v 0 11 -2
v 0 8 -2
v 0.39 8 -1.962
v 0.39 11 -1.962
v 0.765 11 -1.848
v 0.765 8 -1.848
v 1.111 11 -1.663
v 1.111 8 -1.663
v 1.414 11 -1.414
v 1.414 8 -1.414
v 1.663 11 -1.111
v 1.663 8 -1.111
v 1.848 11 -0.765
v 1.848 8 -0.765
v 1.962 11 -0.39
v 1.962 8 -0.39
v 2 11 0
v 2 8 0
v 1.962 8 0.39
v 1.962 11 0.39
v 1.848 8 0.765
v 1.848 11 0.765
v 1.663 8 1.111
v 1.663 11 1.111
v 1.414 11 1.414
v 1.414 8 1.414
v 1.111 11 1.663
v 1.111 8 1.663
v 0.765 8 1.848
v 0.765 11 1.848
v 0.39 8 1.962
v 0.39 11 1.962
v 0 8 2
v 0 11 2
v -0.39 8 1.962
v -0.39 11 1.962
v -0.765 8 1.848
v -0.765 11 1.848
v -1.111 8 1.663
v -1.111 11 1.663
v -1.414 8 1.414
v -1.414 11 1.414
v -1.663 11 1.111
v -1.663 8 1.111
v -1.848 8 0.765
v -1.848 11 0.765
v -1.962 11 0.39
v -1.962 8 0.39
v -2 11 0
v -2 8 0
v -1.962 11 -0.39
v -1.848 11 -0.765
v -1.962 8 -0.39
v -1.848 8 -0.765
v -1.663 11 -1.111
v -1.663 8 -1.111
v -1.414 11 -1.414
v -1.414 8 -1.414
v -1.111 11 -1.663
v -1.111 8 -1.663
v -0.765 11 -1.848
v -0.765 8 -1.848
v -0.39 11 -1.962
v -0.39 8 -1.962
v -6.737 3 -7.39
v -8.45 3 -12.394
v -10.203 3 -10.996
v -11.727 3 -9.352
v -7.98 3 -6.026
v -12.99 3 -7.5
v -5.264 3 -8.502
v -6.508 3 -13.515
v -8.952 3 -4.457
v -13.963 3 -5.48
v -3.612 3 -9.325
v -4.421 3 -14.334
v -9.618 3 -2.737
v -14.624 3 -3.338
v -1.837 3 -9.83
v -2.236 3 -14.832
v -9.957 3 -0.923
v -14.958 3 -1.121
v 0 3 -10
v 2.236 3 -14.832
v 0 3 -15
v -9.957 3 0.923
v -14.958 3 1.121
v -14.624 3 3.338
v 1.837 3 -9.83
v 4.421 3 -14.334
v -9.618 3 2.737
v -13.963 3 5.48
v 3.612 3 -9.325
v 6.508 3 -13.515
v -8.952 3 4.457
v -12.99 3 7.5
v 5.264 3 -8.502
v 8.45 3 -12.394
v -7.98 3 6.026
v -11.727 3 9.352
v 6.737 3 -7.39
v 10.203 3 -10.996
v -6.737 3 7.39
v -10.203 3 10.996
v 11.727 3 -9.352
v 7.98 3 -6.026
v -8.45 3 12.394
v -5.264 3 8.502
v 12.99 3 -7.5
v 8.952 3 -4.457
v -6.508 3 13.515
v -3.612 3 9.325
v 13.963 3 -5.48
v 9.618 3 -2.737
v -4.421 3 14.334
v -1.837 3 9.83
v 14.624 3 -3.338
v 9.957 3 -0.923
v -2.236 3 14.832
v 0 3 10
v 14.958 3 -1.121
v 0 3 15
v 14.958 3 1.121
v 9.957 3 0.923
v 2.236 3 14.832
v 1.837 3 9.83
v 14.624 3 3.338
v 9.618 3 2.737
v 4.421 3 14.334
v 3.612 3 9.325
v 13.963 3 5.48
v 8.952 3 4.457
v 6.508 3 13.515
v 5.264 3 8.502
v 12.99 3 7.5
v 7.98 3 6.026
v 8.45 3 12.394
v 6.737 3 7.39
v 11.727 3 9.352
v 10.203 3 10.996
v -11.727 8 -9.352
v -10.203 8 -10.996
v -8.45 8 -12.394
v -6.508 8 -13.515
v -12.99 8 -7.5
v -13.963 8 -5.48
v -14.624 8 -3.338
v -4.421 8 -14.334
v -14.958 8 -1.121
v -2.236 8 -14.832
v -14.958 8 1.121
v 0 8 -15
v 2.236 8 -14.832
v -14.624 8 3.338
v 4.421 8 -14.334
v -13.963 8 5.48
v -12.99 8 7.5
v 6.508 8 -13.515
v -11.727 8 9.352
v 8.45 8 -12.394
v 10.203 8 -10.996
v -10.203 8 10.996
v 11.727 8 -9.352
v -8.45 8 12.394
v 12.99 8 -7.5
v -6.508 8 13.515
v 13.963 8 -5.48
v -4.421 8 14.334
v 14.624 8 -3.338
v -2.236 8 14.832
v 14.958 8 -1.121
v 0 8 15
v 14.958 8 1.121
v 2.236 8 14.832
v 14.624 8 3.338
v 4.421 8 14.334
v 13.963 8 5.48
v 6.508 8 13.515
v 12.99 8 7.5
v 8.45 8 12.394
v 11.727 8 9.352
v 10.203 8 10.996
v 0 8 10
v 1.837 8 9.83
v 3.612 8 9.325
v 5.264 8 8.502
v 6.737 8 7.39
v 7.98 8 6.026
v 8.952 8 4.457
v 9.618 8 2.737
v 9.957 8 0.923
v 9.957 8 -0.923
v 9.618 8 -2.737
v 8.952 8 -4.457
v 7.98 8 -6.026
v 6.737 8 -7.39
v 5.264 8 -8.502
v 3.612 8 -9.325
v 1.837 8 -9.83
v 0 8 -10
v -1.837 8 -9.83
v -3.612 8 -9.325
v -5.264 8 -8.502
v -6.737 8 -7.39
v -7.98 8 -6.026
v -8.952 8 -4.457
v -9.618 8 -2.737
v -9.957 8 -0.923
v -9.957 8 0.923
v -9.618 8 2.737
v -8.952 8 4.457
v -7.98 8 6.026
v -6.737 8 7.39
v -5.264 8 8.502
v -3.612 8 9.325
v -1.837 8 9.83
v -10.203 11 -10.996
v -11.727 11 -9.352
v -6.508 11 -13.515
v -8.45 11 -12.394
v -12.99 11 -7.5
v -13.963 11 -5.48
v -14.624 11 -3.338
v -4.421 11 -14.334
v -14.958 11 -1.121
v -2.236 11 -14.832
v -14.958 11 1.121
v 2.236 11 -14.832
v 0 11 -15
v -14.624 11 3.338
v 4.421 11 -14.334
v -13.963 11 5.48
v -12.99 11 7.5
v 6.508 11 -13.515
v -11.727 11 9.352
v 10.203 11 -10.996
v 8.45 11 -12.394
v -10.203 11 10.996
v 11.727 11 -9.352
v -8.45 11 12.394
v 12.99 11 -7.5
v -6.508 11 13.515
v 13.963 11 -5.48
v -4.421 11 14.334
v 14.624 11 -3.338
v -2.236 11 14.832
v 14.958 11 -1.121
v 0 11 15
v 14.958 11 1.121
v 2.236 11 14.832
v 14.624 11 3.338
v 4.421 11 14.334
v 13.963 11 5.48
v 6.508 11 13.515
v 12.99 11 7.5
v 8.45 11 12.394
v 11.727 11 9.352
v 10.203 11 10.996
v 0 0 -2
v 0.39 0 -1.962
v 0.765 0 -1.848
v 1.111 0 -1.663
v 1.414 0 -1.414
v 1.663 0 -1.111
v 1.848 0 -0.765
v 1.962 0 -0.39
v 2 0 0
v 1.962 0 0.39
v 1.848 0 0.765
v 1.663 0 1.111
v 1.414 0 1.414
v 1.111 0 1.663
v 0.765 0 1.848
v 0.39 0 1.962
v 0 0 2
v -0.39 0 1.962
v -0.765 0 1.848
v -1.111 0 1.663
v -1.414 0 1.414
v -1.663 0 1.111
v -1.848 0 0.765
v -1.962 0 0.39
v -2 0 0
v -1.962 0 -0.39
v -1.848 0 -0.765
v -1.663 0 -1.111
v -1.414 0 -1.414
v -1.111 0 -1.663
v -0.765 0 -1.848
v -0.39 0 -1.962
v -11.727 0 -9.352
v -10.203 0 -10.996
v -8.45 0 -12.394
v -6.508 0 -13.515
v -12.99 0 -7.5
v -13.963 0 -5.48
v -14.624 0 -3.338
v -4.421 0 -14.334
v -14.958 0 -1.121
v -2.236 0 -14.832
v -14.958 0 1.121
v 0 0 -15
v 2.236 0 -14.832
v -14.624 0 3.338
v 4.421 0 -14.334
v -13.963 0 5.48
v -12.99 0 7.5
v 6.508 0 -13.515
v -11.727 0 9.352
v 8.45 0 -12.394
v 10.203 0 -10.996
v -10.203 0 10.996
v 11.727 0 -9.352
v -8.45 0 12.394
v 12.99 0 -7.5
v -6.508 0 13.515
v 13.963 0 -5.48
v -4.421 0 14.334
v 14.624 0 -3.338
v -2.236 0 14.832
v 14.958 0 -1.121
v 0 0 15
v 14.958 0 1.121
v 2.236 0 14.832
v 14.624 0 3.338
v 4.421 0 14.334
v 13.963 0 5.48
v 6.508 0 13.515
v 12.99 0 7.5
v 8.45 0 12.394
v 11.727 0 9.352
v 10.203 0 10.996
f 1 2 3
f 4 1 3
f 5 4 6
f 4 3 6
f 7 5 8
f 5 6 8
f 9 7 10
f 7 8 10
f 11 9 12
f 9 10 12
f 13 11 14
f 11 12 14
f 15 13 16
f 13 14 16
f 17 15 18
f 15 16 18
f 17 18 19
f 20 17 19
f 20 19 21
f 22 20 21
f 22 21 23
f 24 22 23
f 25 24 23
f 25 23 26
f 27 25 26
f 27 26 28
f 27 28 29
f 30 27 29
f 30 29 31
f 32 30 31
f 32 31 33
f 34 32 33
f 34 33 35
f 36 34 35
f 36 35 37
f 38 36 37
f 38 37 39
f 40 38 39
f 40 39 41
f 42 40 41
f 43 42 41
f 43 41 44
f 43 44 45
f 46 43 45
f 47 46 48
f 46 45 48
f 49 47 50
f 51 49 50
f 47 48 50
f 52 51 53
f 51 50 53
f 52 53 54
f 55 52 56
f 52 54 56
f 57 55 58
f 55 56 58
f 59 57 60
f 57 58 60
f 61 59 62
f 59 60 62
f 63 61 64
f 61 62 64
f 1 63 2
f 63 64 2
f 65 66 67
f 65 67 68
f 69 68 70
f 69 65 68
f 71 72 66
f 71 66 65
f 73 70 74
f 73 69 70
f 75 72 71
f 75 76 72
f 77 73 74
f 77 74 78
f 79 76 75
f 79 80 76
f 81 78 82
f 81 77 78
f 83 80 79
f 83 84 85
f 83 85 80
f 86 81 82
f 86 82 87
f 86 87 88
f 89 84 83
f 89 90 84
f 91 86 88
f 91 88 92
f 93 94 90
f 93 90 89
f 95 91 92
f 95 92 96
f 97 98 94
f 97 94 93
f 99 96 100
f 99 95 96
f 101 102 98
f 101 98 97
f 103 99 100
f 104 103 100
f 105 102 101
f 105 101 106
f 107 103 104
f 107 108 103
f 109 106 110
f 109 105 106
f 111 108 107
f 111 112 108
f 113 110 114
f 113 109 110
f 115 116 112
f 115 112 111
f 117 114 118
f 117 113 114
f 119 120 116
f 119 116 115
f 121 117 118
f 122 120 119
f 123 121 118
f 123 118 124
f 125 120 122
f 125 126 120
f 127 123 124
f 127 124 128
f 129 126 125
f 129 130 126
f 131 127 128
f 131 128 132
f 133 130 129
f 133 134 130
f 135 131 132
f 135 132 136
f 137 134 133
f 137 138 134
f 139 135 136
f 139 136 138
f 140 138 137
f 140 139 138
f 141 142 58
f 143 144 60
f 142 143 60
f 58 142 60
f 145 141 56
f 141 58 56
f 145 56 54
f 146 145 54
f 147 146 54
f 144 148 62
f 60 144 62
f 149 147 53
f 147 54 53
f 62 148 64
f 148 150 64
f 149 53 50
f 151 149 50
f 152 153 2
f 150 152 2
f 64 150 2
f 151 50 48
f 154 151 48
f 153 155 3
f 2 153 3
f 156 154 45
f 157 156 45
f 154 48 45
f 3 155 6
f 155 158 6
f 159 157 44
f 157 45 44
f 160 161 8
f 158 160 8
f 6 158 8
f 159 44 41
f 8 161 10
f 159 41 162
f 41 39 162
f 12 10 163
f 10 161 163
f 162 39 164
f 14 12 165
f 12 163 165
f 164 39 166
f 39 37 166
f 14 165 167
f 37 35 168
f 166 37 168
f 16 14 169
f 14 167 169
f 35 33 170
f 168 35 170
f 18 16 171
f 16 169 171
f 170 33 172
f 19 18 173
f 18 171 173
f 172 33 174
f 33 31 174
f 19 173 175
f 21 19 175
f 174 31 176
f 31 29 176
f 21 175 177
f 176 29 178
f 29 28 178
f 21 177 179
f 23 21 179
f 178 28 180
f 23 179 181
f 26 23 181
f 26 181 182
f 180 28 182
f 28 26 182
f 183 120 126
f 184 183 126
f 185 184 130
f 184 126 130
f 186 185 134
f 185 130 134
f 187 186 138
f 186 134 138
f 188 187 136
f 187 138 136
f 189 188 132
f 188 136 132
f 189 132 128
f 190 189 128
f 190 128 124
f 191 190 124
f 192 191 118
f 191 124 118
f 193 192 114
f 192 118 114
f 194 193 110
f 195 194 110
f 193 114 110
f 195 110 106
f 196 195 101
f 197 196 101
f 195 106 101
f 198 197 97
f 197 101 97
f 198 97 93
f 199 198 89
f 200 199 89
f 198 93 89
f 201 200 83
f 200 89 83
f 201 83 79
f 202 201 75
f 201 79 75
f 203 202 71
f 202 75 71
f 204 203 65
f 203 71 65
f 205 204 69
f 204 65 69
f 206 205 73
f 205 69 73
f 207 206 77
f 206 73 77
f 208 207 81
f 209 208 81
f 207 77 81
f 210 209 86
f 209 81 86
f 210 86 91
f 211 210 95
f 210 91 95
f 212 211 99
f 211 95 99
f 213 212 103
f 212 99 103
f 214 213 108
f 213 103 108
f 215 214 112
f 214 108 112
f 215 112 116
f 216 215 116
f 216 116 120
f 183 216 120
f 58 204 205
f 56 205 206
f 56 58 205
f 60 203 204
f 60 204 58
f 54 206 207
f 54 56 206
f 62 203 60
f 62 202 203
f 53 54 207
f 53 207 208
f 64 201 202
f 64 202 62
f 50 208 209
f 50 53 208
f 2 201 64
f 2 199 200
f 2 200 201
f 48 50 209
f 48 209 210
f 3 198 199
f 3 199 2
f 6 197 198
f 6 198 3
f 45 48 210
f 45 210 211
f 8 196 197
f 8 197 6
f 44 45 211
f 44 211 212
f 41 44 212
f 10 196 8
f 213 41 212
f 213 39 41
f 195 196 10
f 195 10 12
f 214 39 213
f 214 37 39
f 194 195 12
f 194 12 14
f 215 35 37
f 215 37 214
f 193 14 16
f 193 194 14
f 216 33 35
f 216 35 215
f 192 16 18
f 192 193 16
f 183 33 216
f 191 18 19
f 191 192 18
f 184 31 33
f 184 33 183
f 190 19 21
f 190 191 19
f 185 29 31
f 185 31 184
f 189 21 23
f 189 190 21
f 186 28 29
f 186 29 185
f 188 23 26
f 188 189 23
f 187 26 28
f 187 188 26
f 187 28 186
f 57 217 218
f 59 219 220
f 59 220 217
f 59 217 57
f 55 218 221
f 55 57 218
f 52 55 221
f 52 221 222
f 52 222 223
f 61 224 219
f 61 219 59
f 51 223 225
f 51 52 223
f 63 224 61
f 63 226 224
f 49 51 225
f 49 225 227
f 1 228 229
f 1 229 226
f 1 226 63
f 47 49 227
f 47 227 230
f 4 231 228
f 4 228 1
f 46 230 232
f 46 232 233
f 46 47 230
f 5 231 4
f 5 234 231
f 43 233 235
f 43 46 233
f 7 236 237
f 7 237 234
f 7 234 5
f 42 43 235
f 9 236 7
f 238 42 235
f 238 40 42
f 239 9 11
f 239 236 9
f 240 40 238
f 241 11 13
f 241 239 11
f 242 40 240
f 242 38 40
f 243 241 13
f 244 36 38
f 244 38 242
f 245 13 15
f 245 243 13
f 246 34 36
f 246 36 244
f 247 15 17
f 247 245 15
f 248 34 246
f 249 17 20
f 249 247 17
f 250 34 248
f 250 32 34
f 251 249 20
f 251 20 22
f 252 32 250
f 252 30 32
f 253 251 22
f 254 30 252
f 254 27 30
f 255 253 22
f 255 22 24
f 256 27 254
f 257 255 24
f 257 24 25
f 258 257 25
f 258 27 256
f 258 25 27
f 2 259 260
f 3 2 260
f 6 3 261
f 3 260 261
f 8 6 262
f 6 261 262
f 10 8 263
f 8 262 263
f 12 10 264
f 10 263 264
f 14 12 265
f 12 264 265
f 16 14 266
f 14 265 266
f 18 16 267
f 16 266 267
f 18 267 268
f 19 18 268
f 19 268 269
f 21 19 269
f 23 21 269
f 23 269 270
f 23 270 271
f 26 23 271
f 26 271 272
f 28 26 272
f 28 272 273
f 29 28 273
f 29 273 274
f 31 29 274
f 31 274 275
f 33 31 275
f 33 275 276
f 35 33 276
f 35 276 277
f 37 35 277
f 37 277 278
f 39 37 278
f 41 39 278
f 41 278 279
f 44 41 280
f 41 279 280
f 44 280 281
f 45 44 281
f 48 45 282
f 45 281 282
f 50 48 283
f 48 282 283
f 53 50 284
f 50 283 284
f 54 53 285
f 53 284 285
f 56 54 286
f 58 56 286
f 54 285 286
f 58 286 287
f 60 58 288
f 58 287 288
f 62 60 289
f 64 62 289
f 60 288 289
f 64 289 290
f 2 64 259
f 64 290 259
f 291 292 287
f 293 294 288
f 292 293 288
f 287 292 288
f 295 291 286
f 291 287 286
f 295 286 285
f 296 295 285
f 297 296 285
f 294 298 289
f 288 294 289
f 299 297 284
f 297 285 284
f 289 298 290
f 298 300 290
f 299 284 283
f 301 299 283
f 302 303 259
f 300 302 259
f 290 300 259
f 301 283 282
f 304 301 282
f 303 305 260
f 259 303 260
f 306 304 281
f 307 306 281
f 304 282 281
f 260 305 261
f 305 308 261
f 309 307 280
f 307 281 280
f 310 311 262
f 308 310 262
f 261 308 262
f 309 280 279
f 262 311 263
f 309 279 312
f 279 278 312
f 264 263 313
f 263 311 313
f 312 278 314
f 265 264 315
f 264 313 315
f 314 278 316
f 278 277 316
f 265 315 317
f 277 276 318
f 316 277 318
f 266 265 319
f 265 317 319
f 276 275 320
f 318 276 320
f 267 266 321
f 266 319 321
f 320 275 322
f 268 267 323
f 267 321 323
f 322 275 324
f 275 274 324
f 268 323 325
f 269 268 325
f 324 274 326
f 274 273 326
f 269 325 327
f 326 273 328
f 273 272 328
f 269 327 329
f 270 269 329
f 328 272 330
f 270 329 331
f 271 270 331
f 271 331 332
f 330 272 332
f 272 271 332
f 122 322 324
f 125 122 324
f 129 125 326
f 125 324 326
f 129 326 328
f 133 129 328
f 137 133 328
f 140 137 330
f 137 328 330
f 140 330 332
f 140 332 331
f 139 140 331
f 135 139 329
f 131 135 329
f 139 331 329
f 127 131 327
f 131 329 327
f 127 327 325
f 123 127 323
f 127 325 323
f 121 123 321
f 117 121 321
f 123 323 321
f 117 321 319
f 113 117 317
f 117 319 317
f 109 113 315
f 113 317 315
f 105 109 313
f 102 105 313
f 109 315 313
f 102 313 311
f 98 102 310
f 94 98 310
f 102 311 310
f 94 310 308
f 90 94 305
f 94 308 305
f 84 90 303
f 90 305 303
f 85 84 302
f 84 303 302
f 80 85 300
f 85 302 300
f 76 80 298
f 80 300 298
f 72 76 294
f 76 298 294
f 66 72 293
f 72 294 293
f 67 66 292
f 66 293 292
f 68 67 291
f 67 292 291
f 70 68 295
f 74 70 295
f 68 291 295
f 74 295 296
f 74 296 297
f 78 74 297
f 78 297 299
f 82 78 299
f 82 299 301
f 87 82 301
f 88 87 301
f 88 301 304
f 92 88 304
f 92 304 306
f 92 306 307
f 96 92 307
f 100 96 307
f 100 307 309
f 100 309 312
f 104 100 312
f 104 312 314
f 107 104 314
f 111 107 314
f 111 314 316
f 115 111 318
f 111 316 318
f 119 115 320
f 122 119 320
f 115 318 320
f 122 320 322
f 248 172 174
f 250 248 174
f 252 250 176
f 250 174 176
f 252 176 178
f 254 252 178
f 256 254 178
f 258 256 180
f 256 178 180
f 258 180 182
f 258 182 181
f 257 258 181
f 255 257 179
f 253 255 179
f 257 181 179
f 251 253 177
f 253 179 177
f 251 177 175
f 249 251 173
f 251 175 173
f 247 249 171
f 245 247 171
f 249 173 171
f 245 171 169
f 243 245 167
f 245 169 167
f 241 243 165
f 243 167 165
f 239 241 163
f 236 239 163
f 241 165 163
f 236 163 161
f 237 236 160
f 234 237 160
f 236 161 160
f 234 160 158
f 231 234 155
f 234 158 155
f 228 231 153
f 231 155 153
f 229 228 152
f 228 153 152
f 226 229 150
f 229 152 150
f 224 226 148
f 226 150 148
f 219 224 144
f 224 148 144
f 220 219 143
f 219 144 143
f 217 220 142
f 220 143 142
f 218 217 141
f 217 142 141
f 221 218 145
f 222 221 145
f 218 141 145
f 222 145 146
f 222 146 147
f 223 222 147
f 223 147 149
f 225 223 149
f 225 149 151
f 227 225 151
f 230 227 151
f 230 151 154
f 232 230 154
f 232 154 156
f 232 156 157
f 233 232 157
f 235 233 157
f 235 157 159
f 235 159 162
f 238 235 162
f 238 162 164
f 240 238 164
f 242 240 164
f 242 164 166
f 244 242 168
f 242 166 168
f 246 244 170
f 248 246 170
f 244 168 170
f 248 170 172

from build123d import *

# Parameters (mm, degrees)
SKETCH_1_R          = 15
EXTRUDE_1_DEPTH     = 3
SKETCH_2_R          = 10
EXTRUDE_2_DEPTH     = 5
SKETCH_3_R          = 15
EXTRUDE_3_DEPTH     = 3
SKETCH_5_R          = 2
CUT_EXTRUDE_1_DEPTH = 24.895606291


with BuildPart() as part:
    # ｽｹｯﾁ1 → ﾎﾞｽ - 押し出し1 (new body)
    with BuildSketch(Plane(origin=(0, 0, 0), x_dir=(1, 0, 0), z_dir=(0, 1, 0))):
        with Locations(Location((0, 0, 0), (0, 0, 270))):
            Circle(SKETCH_1_R)
    extrude(amount=EXTRUDE_1_DEPTH)

    # ｽｹｯﾁ2 → ﾎﾞｽ - 押し出し2 (add)
    with BuildSketch(Plane(origin=(0, 3, 0), x_dir=(1, 0, 0), z_dir=(0, 1, 0))):
        with Locations(Location((0, 0, 0), (0, 0, 270))):
            Circle(SKETCH_2_R)
    extrude(amount=EXTRUDE_2_DEPTH)


with BuildPart() as body_2:
    # ｽｹｯﾁ3 → ﾎﾞｽ - 押し出し3 (new body)
    with BuildSketch(Plane(origin=(0, 8, 0), x_dir=(1, 0, 0), z_dir=(0, 1, 0))):
        with Locations(Location((0, 0, 0), (0, 0, 270))):
            Circle(SKETCH_3_R)
    extrude(amount=EXTRUDE_3_DEPTH)


with BuildPart() as cut_extrude_1_tool:
    # ｽｹｯﾁ5 → ｶｯﾄ - 押し出し1 (new, through all)
    with BuildSketch(Plane.XZ):
        with Locations(Location((0, 0, 0), (0, 0, 270))):
            Circle(SKETCH_5_R)
    extrude(amount=-CUT_EXTRUDE_1_DEPTH)


with BuildPart() as part_1:
    add(part.part)

    # ｶｯﾄ - 押し出し1: cut by cut_extrude_1_tool
    add(cut_extrude_1_tool.part, mode=Mode.SUBTRACT)


with BuildPart() as body_2_1:
    add(body_2.part)

    # ｶｯﾄ - 押し出し1: cut by cut_extrude_1_tool
    add(cut_extrude_1_tool.part, mode=Mode.SUBTRACT)


solid = Compound([part_1.part, body_2_1.part])
